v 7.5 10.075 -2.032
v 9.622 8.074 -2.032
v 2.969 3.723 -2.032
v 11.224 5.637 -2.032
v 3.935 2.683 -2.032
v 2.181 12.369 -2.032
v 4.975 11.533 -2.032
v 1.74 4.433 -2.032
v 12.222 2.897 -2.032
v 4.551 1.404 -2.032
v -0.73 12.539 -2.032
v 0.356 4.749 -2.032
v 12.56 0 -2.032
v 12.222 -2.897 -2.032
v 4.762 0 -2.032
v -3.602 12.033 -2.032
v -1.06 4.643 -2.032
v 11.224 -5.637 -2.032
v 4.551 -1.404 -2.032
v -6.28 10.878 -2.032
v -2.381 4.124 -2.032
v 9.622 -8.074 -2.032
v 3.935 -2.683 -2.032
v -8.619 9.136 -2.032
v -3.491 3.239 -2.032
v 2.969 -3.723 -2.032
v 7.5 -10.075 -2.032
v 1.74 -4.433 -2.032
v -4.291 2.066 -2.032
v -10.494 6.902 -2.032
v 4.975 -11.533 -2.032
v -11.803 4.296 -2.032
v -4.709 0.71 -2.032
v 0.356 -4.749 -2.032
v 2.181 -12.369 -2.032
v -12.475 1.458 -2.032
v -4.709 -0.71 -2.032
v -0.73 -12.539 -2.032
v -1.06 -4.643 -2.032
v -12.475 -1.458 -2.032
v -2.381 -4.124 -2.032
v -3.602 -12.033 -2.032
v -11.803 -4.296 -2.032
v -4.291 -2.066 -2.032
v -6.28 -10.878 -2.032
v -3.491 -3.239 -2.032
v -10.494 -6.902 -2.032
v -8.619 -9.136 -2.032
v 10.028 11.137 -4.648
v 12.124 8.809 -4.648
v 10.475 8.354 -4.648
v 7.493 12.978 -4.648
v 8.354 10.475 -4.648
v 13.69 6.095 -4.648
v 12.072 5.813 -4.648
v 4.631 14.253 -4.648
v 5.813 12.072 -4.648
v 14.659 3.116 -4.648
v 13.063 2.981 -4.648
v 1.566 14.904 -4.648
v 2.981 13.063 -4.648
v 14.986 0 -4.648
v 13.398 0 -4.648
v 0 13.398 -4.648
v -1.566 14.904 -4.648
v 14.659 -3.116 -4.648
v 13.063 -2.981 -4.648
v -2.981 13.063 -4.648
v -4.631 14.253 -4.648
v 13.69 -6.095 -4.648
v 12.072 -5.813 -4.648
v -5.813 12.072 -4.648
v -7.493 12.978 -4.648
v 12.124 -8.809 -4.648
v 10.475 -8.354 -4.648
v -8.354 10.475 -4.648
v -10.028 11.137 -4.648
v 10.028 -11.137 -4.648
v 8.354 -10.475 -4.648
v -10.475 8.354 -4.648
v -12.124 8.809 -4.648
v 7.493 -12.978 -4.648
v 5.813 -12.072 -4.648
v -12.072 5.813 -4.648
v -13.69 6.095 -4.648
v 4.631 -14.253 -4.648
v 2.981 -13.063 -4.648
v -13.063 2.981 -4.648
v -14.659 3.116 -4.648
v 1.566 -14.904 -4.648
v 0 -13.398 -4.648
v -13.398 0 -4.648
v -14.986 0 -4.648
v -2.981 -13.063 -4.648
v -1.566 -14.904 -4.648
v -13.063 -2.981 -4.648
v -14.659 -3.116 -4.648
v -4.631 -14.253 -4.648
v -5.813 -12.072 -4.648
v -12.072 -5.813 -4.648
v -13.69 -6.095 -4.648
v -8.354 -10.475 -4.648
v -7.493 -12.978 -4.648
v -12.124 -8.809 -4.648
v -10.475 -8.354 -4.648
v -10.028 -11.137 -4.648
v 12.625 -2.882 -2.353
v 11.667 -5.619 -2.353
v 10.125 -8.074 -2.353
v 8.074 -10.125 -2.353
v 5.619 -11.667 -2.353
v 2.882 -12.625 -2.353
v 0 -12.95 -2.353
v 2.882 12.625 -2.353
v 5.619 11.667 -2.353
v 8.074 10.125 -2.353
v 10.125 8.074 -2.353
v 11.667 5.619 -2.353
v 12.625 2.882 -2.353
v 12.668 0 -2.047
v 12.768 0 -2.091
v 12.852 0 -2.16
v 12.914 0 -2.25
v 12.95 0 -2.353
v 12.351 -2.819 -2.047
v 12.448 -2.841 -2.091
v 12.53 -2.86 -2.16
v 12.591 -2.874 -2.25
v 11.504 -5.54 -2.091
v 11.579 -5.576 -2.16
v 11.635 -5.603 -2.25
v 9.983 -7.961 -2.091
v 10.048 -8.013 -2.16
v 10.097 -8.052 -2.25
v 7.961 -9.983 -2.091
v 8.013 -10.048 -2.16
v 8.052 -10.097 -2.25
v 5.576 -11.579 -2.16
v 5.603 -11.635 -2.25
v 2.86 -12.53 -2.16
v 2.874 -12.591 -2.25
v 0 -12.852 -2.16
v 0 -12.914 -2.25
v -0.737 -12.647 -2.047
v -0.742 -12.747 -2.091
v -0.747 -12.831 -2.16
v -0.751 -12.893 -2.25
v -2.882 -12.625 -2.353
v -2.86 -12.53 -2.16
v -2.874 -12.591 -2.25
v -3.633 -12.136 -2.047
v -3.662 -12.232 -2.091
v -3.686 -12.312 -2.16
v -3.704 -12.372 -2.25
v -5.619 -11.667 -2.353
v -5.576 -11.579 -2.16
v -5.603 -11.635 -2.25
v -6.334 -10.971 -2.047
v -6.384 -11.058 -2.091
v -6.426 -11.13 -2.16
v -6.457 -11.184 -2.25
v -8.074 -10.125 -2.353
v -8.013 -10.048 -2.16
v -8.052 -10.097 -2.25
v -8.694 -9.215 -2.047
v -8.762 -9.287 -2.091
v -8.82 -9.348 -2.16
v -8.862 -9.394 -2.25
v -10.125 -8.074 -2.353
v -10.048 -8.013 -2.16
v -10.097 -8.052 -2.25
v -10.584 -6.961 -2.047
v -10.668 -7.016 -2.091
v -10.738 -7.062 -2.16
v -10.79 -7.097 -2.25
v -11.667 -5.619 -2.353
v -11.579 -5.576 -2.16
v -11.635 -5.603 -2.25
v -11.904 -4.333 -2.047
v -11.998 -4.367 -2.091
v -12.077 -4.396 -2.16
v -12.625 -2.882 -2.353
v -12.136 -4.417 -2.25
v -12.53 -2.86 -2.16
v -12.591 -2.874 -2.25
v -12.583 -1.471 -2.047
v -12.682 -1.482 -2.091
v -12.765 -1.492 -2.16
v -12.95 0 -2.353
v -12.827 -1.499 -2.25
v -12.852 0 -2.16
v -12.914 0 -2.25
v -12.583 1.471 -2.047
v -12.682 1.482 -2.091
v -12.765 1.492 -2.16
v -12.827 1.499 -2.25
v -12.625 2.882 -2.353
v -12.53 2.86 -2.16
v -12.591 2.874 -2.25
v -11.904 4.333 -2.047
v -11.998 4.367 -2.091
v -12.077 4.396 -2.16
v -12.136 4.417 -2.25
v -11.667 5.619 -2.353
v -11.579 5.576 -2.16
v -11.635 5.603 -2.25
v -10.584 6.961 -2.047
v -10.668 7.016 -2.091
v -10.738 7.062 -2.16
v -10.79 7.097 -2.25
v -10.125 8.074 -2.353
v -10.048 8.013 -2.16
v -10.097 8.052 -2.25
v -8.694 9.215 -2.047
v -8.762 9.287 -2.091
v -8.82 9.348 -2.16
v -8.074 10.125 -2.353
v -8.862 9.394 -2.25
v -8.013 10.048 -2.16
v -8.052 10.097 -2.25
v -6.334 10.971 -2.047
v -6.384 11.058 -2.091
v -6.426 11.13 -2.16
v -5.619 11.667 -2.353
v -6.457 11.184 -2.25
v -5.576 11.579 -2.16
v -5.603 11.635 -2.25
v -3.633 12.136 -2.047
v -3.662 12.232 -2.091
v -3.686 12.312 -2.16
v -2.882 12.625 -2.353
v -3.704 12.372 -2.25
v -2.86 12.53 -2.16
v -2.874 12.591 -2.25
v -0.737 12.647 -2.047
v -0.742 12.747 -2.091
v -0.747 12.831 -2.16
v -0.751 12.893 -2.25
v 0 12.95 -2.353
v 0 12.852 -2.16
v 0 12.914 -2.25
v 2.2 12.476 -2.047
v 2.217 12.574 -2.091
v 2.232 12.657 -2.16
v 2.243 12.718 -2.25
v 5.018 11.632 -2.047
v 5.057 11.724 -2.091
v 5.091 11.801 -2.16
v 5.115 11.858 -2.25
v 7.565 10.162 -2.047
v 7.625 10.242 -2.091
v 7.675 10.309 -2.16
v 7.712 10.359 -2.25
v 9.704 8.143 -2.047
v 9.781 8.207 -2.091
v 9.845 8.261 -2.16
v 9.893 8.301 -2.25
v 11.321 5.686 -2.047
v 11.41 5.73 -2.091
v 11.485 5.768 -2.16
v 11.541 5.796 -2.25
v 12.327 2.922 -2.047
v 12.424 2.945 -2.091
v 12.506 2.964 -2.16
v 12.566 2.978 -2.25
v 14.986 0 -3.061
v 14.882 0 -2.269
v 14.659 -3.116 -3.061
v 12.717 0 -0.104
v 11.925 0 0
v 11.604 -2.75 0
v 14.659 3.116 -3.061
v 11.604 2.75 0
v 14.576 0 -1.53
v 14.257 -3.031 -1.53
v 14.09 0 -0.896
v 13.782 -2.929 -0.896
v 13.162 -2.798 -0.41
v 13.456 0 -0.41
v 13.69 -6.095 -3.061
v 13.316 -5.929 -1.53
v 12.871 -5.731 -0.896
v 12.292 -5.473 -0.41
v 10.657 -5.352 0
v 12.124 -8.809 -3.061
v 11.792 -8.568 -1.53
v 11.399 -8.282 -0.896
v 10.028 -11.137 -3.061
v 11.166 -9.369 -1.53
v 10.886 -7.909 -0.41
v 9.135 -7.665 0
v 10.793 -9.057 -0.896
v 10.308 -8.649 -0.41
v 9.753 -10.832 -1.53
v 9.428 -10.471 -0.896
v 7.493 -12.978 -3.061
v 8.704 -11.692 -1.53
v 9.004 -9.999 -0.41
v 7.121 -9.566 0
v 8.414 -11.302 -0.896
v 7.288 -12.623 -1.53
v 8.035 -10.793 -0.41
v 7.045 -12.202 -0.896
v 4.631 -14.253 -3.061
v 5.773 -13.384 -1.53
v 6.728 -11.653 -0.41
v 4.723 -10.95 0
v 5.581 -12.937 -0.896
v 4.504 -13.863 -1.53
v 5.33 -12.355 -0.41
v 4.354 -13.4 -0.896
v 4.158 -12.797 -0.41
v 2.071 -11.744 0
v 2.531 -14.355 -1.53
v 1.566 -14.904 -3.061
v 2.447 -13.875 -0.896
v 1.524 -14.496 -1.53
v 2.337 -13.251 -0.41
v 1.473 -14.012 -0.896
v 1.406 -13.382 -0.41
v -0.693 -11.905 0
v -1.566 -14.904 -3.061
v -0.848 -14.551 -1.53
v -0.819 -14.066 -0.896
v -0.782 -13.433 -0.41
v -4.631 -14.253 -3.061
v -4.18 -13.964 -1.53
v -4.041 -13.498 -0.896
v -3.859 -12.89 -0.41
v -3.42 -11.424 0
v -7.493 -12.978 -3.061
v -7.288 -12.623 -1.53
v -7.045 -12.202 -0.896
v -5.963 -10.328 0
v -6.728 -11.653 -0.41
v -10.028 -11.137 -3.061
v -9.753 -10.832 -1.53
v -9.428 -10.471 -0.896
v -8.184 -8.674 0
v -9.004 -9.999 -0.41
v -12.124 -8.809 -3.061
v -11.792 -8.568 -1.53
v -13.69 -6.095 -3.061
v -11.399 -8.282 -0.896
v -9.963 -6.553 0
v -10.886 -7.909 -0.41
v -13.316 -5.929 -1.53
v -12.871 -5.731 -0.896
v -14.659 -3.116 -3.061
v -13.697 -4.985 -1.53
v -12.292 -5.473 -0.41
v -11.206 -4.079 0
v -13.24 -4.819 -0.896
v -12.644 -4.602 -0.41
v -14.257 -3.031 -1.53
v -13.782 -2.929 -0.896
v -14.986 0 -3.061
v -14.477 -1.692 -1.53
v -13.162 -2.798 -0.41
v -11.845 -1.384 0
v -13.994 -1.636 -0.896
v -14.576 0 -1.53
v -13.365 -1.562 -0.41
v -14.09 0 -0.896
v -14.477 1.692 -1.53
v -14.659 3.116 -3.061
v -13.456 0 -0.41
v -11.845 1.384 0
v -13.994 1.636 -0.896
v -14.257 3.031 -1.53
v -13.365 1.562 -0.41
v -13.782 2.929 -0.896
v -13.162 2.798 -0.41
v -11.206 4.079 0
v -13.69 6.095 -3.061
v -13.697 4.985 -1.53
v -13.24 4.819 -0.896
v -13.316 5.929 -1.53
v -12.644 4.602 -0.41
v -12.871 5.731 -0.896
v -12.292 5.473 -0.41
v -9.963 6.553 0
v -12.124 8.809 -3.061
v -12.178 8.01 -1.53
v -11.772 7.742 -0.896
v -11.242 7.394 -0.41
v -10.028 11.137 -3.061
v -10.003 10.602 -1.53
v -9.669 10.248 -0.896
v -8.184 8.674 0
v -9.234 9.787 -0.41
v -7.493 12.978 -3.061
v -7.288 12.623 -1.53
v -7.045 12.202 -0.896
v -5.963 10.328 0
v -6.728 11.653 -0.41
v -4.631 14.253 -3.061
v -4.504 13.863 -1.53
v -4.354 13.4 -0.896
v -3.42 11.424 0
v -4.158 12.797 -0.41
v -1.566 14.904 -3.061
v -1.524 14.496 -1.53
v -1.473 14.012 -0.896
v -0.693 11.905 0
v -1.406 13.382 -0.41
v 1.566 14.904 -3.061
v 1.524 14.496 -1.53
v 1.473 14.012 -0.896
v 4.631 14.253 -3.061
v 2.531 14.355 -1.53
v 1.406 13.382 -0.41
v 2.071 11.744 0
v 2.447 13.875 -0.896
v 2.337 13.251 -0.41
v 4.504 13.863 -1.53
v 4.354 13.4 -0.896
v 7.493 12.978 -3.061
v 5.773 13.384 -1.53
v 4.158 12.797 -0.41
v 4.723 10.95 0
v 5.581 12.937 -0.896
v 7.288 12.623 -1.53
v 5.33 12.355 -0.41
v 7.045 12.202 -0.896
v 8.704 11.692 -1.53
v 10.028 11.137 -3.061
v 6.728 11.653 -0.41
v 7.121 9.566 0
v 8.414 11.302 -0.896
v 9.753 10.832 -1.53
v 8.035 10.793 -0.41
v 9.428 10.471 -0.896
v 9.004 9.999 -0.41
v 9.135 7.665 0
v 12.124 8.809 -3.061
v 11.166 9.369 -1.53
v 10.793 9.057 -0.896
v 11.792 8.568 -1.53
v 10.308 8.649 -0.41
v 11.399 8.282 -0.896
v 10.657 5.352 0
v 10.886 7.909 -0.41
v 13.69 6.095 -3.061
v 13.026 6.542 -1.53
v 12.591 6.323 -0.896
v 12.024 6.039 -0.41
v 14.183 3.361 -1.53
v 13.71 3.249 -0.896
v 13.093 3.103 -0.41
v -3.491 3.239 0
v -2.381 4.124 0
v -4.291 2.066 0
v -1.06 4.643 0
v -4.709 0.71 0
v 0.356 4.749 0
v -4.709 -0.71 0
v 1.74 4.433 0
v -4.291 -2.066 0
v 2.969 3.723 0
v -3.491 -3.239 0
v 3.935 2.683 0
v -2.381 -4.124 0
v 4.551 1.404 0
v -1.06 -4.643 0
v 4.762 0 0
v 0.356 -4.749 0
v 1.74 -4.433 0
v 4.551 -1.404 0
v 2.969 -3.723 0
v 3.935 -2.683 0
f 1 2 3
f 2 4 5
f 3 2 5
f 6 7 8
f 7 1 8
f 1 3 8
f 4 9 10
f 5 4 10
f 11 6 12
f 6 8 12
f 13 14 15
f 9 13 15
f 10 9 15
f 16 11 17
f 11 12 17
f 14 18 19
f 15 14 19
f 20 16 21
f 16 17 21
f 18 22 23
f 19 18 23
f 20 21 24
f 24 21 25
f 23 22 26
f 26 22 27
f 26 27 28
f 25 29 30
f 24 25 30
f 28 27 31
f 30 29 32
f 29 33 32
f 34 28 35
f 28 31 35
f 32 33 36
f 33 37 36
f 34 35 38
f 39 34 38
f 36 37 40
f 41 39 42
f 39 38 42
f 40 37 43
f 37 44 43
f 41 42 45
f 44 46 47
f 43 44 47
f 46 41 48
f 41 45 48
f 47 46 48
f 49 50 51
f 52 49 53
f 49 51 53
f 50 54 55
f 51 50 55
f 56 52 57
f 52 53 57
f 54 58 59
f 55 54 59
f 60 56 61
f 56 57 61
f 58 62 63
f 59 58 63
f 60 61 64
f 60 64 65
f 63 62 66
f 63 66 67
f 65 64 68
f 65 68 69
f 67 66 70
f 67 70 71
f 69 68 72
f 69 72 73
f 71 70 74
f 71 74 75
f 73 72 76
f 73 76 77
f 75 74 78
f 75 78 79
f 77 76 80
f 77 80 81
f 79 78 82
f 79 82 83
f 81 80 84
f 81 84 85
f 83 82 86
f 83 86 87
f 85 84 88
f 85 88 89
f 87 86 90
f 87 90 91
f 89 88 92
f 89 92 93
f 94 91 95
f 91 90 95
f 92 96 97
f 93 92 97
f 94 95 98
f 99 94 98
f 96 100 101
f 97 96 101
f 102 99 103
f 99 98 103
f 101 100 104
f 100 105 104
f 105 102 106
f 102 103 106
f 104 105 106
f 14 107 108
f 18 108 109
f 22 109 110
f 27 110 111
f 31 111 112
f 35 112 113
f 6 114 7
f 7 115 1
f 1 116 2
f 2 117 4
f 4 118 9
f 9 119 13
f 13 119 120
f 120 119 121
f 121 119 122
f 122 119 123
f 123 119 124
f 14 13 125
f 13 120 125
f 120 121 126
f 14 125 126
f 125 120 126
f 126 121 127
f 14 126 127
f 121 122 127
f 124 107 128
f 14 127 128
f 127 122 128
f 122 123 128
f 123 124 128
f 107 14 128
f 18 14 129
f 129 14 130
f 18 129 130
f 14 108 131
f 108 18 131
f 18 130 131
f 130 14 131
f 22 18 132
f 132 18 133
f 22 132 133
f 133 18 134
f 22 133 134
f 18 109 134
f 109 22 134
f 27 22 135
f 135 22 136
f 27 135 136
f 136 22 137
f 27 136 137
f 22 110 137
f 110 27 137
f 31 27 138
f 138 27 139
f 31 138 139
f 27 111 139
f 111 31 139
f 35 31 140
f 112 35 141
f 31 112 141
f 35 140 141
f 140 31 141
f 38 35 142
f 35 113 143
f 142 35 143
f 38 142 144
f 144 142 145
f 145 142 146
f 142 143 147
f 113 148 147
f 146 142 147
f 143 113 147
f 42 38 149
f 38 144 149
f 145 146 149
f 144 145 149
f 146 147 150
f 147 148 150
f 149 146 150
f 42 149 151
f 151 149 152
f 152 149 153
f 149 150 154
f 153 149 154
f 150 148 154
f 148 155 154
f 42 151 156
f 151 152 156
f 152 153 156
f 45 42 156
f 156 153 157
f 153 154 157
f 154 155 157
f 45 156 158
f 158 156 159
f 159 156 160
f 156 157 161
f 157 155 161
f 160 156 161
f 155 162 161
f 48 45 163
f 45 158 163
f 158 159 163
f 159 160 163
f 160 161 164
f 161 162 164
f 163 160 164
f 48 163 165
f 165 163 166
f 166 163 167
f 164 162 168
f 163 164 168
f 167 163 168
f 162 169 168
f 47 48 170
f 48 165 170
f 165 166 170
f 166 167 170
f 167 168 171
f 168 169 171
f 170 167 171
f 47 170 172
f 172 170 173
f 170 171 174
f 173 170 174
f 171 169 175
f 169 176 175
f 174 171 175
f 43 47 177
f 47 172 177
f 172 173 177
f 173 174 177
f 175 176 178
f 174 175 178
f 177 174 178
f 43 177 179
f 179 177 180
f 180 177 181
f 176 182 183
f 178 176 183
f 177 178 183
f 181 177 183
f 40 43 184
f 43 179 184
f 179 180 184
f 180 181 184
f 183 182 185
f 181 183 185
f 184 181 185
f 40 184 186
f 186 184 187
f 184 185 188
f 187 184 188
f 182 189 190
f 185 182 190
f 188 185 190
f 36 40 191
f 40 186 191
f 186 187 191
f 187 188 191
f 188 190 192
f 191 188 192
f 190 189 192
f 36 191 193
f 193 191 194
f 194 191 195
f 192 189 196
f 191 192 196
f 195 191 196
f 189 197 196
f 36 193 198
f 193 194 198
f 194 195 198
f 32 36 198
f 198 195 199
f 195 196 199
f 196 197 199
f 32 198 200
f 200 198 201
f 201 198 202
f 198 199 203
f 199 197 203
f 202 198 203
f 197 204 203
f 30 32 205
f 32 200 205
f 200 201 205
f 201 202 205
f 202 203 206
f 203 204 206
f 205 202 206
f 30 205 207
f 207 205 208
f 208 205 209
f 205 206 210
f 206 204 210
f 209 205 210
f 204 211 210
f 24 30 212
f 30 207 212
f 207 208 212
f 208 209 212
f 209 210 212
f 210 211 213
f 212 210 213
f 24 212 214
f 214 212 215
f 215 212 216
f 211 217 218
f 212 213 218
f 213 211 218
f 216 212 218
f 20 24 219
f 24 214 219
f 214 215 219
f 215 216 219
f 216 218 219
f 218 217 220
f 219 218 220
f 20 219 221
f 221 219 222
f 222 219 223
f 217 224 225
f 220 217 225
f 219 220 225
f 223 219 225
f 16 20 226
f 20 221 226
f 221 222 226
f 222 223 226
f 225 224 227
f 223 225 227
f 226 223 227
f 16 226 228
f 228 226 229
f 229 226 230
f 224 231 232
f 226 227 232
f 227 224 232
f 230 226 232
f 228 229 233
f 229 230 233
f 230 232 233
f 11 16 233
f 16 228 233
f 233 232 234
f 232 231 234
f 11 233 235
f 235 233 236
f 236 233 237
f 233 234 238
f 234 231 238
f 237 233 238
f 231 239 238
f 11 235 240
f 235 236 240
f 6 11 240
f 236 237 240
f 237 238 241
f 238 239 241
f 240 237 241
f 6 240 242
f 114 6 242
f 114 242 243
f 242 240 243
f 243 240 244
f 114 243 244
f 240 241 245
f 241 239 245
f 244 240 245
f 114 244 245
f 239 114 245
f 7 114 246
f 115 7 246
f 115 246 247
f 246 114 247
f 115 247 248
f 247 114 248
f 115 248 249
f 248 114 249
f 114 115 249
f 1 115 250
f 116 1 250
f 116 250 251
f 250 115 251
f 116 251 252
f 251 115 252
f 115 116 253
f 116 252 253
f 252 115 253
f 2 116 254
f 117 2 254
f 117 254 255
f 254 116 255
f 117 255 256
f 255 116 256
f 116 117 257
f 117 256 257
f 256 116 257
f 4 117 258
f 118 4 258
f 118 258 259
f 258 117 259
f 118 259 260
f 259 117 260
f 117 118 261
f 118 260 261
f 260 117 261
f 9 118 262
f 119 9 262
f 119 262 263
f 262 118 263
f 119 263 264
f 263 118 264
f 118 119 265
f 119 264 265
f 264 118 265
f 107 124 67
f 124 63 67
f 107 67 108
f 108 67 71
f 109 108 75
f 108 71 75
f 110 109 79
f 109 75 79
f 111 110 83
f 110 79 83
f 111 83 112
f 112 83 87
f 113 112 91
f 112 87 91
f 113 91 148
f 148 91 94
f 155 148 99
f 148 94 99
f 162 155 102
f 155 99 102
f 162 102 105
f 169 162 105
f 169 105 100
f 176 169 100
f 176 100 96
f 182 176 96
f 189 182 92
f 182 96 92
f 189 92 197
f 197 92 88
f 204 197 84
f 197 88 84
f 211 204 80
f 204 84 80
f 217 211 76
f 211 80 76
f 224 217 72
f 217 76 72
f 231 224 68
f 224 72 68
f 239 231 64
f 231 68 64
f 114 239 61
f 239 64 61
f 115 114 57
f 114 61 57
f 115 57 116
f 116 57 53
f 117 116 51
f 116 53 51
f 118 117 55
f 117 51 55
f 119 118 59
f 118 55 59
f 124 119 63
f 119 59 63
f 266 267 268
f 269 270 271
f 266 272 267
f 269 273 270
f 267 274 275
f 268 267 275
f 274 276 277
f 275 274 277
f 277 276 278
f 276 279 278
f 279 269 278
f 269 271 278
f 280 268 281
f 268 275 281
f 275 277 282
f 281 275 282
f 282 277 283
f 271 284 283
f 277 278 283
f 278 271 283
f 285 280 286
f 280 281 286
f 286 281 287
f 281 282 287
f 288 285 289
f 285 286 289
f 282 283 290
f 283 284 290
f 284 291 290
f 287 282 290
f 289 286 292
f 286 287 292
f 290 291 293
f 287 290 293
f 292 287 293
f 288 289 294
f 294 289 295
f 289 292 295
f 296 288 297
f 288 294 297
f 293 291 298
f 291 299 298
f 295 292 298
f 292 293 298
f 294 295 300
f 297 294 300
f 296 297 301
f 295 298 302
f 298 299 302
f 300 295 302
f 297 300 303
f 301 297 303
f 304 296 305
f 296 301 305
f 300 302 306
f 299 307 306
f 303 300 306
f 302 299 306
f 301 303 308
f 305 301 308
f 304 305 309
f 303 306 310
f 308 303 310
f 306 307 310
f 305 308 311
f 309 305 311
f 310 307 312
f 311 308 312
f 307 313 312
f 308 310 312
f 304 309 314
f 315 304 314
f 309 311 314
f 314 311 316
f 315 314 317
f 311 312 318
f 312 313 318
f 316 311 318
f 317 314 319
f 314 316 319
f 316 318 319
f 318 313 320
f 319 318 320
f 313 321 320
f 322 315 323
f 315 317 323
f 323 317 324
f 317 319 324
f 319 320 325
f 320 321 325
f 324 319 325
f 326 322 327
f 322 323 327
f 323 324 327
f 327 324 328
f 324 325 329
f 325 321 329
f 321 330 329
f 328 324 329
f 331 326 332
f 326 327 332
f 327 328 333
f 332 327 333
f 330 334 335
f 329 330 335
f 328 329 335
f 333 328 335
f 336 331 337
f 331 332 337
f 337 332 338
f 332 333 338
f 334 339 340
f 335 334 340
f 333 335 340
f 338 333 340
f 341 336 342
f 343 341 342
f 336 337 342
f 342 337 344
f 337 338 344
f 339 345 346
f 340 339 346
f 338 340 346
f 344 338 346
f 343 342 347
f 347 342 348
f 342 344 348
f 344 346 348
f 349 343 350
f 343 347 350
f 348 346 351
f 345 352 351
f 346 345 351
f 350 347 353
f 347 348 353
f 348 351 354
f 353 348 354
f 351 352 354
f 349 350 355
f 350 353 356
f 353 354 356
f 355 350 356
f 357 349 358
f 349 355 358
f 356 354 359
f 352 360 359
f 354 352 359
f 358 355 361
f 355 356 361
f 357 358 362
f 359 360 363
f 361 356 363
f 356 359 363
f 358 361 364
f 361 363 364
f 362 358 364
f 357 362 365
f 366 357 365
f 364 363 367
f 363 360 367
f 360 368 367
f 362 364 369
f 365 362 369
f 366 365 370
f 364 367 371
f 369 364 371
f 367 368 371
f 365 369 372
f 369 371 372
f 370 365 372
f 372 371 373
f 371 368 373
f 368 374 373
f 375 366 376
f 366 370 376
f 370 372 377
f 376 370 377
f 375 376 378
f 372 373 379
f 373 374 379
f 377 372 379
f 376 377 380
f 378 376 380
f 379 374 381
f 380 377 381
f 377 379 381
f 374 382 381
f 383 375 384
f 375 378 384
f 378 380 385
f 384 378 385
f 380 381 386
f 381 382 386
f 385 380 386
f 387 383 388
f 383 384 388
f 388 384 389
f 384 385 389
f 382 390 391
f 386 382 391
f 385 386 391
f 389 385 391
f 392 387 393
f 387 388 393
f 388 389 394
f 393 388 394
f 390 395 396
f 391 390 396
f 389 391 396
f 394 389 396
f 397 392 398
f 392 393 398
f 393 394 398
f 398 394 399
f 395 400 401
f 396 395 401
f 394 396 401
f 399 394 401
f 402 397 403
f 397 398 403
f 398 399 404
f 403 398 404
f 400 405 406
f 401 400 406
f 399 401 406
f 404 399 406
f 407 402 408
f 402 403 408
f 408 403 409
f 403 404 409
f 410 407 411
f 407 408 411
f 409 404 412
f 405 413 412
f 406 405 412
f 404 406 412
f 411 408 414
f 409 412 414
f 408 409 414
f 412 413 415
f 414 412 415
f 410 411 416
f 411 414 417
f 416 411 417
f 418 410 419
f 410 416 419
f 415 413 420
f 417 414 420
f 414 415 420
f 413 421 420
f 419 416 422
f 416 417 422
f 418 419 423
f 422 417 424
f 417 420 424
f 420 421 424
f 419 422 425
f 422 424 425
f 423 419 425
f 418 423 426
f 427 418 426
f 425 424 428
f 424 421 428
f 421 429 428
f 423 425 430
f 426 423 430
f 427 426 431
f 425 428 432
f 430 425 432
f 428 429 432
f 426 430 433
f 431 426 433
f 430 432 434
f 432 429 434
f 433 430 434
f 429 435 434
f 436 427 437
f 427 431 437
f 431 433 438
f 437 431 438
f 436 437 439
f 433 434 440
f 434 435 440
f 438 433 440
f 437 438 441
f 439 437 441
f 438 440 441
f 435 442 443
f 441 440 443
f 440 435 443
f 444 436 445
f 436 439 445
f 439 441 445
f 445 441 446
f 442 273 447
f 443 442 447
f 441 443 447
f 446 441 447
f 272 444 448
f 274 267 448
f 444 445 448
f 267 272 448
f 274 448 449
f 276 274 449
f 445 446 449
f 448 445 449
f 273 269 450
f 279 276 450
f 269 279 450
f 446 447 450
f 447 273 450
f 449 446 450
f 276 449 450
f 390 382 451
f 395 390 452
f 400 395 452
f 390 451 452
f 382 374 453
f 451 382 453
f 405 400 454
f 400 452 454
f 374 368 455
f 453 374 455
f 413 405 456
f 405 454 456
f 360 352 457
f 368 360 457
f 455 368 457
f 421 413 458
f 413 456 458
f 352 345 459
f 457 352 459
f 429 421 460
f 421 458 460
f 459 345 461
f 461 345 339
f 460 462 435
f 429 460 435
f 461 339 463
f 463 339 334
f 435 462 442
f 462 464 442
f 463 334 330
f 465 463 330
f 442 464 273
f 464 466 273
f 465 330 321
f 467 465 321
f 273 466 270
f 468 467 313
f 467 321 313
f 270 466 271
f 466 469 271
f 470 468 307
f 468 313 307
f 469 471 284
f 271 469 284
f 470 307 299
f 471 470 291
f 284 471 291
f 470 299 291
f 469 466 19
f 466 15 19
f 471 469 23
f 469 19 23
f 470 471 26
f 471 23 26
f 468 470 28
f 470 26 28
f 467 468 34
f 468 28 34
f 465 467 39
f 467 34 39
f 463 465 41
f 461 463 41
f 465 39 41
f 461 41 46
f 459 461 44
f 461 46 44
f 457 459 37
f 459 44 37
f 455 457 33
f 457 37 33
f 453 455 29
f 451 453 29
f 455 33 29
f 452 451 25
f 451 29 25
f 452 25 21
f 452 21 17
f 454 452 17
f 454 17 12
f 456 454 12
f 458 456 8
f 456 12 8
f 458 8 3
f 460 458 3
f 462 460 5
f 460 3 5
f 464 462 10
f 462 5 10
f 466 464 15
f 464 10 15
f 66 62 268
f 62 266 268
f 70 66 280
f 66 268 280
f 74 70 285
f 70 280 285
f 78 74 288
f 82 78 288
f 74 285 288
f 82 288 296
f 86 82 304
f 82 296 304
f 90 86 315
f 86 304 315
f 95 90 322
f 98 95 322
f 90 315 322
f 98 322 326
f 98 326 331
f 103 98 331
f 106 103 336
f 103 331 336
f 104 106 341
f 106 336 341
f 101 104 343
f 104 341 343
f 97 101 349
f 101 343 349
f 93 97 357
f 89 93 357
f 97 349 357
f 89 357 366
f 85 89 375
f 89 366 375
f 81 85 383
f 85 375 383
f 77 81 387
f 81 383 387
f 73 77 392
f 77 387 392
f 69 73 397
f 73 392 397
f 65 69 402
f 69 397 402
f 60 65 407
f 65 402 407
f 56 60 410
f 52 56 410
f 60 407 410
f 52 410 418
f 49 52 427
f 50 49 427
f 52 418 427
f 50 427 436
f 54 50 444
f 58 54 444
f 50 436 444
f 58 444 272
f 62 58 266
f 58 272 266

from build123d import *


with BuildPart() as part:
    # Sketch1 → Revolve1 (revolve)
    with BuildSketch(Plane(origin=(0, 0, 0), x_dir=(1, 0, 0), z_dir=(0, 1, 0))):
        with BuildLine():
            ThreePointArc((12.5603, 2.032), (12.812582596, 2.122503889), (12.949803492, 2.352738309))
            Line((12.949803492, 2.352738309), (13.3985, 4.6482))
            Line((13.3985, 4.6482), (14.986, 4.6482))
            Line((14.986, 4.6482), (14.986, 3.0607))
            ThreePointArc((14.986, 3.0607), (14.089541725, 0.896458275), (11.9253, 0))
            Line((11.9253, 0), (4.7625, 0))
            Line((4.7625, 0), (4.7625, 2.032))
            Line((4.7625, 2.032), (12.5603, 2.032))
        make_face()
    revolve(axis=Axis((0, 0, 0), (0, 0, -1)))


solid = part.part
